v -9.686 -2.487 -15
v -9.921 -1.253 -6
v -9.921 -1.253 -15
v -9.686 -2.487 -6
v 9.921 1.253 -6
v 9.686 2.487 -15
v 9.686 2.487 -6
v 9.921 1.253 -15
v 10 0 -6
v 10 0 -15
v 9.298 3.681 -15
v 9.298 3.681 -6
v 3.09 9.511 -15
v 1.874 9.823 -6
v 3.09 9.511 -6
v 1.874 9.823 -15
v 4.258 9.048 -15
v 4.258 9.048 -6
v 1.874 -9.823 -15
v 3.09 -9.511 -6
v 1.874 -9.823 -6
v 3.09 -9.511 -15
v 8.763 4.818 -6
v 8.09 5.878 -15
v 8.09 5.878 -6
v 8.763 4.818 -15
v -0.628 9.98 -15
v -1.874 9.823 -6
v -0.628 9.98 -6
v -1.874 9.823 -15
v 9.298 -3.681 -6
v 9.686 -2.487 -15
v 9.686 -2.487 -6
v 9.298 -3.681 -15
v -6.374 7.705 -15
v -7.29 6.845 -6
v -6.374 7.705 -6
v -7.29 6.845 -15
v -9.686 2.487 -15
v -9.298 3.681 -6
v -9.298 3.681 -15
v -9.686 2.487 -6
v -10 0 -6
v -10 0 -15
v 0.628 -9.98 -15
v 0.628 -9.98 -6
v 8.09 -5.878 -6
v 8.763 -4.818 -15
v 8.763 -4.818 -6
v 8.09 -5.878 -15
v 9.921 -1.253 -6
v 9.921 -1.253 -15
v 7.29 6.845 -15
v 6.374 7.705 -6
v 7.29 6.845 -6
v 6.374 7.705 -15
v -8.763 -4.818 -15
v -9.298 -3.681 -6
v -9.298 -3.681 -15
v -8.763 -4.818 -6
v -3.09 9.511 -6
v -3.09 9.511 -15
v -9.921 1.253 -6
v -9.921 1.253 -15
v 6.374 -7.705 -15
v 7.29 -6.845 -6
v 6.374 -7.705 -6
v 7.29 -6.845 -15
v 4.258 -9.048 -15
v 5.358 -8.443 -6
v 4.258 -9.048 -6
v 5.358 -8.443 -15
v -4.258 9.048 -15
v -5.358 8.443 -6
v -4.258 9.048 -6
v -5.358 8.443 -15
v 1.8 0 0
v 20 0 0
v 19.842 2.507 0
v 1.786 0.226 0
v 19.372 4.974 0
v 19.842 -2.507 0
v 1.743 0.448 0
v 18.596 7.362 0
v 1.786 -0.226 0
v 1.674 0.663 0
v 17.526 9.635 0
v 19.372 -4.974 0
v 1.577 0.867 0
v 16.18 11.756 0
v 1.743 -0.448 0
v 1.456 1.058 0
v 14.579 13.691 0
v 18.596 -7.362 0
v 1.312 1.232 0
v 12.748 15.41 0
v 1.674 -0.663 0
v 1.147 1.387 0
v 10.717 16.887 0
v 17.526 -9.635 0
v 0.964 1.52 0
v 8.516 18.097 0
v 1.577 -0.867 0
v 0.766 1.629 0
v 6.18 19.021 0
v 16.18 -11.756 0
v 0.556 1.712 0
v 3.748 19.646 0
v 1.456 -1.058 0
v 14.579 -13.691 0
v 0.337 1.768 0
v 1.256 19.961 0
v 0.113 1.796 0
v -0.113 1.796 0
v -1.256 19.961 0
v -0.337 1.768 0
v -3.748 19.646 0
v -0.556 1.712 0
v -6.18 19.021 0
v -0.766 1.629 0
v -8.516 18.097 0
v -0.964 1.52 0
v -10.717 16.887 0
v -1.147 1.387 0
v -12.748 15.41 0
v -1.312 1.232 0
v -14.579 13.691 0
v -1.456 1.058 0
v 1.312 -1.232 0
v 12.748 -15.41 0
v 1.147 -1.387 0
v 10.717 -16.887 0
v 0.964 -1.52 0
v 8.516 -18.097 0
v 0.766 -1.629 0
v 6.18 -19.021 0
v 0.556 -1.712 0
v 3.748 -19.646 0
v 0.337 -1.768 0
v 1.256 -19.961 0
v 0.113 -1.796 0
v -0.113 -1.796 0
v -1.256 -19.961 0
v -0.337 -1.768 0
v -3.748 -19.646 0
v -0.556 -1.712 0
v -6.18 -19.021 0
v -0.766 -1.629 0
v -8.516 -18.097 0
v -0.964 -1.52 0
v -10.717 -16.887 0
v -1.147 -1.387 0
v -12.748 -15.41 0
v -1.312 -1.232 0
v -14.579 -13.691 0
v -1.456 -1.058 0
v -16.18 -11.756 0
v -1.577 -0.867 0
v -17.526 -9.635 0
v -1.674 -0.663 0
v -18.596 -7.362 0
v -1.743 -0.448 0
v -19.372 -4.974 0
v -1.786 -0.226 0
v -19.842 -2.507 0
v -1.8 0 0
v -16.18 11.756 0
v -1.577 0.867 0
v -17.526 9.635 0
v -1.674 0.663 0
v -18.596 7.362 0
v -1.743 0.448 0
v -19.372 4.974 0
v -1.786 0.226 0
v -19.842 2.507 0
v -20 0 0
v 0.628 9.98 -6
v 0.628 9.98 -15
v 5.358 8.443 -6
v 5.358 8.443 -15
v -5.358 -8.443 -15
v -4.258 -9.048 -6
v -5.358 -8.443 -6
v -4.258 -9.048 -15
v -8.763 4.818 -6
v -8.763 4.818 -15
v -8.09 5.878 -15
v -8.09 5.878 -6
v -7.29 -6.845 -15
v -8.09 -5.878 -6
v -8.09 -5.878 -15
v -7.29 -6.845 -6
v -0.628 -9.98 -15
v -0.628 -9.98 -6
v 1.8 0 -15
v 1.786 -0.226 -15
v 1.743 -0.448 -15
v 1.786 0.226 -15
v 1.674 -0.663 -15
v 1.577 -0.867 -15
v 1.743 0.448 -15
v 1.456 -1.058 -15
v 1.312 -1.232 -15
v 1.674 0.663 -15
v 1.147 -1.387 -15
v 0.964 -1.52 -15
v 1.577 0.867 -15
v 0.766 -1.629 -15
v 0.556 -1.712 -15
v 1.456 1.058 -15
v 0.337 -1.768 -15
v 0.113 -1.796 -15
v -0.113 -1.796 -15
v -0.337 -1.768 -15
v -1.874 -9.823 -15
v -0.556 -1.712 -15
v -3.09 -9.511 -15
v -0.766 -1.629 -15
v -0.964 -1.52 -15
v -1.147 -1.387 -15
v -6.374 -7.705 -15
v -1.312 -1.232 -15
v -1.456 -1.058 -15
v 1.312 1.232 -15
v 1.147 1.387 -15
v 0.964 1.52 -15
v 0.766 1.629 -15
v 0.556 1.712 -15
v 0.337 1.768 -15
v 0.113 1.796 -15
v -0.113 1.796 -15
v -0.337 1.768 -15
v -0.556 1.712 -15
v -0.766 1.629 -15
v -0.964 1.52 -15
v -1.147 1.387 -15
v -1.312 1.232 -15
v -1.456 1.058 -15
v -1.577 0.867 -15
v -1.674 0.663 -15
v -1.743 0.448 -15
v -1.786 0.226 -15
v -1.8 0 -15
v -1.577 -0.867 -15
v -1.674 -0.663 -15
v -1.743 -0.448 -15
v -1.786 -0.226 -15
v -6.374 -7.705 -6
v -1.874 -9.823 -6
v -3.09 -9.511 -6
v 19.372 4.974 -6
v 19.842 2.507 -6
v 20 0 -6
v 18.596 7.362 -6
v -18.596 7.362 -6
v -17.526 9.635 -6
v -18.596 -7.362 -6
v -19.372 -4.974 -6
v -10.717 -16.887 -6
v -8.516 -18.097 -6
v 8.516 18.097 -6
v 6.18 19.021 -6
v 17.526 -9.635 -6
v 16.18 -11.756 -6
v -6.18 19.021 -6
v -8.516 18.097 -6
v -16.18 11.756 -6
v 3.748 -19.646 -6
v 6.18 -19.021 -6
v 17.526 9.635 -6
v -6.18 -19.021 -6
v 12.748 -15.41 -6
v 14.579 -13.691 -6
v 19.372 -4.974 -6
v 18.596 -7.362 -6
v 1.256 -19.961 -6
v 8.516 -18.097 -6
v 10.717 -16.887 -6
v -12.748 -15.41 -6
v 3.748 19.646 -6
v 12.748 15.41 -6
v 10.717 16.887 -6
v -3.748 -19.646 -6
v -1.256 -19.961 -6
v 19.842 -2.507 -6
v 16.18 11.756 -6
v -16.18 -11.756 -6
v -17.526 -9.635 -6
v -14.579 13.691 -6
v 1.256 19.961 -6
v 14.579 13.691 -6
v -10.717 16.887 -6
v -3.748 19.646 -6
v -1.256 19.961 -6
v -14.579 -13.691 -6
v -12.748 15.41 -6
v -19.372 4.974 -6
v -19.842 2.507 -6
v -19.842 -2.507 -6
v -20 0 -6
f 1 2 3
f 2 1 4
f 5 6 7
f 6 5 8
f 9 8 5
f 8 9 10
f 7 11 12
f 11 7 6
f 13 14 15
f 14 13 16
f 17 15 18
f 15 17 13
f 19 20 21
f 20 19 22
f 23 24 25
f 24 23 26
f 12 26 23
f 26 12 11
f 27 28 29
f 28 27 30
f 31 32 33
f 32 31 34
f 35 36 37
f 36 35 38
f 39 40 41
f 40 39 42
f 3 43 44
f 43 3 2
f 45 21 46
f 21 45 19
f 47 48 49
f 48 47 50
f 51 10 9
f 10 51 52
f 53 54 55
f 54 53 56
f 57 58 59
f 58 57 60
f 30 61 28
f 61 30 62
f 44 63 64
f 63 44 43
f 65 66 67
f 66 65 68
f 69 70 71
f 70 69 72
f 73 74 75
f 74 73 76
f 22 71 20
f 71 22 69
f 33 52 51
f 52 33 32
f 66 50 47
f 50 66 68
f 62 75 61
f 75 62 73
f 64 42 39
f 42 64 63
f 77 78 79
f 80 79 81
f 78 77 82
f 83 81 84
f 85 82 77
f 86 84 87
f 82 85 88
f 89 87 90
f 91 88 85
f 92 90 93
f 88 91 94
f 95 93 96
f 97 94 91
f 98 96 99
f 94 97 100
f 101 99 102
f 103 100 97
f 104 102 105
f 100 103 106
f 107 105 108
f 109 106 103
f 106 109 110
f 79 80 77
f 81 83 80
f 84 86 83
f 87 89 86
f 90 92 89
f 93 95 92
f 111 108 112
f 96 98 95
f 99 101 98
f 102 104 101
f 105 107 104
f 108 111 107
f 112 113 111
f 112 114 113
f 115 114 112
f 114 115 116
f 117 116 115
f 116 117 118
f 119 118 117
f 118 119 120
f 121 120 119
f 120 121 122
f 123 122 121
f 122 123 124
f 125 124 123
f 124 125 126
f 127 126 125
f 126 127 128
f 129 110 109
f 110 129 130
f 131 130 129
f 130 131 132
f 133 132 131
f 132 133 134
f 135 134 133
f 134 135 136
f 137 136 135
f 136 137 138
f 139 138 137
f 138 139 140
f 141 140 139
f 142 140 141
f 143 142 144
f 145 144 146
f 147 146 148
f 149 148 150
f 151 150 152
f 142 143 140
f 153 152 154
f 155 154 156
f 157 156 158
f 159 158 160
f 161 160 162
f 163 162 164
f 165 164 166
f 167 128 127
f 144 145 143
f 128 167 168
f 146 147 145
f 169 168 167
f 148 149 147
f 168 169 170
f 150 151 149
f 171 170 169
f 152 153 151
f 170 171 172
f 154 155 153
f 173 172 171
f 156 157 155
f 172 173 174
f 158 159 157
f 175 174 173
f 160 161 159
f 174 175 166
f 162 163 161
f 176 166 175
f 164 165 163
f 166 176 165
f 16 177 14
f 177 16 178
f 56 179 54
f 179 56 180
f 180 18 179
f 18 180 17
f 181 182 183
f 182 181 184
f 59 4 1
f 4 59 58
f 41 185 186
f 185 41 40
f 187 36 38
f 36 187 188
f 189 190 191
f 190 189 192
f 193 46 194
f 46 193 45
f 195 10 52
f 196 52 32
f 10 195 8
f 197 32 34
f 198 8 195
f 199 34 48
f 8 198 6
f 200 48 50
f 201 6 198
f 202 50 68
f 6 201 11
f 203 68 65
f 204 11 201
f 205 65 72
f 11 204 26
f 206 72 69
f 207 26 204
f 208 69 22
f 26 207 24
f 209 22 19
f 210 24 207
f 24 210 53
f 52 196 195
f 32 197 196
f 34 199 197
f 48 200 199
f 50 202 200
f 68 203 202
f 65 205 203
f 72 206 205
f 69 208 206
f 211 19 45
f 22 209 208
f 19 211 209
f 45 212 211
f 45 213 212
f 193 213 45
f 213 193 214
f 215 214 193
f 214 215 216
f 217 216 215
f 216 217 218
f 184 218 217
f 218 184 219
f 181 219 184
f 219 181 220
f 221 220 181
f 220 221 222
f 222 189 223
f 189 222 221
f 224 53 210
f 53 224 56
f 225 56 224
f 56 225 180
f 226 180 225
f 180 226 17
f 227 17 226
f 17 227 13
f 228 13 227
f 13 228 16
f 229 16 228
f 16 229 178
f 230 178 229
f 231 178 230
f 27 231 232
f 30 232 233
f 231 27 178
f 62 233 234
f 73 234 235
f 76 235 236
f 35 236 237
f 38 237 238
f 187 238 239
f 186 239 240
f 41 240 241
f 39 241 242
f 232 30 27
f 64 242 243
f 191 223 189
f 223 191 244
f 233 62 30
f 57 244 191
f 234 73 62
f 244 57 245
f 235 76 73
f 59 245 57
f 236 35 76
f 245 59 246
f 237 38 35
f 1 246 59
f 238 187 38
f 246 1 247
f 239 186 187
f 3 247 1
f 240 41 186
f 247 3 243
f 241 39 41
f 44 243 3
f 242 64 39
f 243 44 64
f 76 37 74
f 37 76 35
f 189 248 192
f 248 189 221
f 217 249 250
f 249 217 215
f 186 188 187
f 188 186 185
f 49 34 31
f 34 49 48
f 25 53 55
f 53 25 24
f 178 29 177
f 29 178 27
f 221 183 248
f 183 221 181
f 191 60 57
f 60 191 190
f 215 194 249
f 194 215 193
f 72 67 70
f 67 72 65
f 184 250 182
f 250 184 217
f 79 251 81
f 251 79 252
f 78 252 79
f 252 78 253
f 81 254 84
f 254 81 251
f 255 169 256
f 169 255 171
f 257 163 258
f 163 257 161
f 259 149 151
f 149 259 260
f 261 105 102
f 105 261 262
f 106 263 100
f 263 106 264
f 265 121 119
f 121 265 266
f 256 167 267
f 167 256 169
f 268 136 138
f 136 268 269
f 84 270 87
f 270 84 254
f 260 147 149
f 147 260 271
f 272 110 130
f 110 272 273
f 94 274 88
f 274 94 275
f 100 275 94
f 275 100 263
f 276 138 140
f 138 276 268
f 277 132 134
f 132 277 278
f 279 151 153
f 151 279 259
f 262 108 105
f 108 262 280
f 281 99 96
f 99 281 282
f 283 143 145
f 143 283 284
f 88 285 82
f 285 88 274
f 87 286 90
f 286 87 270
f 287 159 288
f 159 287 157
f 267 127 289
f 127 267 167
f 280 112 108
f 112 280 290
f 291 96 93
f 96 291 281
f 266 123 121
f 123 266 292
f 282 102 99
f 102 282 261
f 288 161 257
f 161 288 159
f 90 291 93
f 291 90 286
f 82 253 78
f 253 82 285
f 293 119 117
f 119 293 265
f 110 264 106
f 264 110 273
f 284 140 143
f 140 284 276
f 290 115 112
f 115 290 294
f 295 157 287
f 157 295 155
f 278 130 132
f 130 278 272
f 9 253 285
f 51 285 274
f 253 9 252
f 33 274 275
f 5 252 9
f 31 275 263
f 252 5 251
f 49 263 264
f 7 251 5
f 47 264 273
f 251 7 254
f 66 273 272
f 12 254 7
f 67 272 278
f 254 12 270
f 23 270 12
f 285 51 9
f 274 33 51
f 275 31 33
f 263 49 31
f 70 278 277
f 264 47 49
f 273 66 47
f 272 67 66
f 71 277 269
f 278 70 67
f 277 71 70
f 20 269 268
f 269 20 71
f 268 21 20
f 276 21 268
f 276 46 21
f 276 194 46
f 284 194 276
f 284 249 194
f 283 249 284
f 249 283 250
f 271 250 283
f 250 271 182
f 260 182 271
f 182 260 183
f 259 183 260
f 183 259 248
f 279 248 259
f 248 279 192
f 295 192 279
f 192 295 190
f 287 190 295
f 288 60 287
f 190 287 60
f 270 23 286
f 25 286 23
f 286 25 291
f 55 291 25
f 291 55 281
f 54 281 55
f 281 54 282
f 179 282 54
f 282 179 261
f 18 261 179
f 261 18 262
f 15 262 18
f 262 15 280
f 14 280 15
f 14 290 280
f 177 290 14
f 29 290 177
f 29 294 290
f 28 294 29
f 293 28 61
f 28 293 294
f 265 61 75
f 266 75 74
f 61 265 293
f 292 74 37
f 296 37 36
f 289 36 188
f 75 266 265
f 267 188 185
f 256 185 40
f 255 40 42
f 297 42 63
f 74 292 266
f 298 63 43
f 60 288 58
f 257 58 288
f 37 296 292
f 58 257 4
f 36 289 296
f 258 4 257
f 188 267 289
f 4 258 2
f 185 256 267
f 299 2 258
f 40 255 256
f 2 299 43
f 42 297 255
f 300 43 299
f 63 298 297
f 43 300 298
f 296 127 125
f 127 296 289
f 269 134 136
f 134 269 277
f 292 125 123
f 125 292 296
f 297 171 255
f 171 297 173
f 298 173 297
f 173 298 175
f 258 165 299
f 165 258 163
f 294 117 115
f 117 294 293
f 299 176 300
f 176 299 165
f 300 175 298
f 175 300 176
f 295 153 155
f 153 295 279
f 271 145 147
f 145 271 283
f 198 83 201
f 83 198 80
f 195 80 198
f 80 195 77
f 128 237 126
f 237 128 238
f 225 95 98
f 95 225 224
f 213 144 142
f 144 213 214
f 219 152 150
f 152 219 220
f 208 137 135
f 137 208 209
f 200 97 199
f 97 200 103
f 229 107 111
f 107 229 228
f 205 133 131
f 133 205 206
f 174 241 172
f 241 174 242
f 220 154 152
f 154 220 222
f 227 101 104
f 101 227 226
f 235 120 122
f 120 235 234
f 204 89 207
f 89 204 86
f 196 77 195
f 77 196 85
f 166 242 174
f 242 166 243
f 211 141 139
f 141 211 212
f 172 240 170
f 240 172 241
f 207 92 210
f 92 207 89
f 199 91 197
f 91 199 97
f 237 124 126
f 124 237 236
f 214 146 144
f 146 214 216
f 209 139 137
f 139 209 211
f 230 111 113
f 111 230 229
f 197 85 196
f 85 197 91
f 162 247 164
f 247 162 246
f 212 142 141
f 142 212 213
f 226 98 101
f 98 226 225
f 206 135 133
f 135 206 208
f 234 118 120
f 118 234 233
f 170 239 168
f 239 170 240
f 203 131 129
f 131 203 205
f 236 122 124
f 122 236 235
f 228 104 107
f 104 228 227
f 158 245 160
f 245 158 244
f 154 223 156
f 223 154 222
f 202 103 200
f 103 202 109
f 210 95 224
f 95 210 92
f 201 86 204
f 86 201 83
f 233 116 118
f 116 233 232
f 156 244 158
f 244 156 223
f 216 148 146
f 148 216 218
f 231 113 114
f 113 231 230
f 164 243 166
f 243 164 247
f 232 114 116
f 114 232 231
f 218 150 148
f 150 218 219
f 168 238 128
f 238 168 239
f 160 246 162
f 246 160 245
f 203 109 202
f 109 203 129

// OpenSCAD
$fn = 50;


difference() {
	union() {
		translate(v = [0, 0, -15.0000000000]) {
			cylinder(h = 15, r = 10.0000000000);
		}
		translate(v = [0, 0, -6.0000000000]) {
			cylinder(h = 6, r = 20.0000000000);
		}
	}
	union() {
		#translate(v = [0, 0, -15]) {
			cylinder(h = 15, r = 1.8000000000);
		}
	}
}
